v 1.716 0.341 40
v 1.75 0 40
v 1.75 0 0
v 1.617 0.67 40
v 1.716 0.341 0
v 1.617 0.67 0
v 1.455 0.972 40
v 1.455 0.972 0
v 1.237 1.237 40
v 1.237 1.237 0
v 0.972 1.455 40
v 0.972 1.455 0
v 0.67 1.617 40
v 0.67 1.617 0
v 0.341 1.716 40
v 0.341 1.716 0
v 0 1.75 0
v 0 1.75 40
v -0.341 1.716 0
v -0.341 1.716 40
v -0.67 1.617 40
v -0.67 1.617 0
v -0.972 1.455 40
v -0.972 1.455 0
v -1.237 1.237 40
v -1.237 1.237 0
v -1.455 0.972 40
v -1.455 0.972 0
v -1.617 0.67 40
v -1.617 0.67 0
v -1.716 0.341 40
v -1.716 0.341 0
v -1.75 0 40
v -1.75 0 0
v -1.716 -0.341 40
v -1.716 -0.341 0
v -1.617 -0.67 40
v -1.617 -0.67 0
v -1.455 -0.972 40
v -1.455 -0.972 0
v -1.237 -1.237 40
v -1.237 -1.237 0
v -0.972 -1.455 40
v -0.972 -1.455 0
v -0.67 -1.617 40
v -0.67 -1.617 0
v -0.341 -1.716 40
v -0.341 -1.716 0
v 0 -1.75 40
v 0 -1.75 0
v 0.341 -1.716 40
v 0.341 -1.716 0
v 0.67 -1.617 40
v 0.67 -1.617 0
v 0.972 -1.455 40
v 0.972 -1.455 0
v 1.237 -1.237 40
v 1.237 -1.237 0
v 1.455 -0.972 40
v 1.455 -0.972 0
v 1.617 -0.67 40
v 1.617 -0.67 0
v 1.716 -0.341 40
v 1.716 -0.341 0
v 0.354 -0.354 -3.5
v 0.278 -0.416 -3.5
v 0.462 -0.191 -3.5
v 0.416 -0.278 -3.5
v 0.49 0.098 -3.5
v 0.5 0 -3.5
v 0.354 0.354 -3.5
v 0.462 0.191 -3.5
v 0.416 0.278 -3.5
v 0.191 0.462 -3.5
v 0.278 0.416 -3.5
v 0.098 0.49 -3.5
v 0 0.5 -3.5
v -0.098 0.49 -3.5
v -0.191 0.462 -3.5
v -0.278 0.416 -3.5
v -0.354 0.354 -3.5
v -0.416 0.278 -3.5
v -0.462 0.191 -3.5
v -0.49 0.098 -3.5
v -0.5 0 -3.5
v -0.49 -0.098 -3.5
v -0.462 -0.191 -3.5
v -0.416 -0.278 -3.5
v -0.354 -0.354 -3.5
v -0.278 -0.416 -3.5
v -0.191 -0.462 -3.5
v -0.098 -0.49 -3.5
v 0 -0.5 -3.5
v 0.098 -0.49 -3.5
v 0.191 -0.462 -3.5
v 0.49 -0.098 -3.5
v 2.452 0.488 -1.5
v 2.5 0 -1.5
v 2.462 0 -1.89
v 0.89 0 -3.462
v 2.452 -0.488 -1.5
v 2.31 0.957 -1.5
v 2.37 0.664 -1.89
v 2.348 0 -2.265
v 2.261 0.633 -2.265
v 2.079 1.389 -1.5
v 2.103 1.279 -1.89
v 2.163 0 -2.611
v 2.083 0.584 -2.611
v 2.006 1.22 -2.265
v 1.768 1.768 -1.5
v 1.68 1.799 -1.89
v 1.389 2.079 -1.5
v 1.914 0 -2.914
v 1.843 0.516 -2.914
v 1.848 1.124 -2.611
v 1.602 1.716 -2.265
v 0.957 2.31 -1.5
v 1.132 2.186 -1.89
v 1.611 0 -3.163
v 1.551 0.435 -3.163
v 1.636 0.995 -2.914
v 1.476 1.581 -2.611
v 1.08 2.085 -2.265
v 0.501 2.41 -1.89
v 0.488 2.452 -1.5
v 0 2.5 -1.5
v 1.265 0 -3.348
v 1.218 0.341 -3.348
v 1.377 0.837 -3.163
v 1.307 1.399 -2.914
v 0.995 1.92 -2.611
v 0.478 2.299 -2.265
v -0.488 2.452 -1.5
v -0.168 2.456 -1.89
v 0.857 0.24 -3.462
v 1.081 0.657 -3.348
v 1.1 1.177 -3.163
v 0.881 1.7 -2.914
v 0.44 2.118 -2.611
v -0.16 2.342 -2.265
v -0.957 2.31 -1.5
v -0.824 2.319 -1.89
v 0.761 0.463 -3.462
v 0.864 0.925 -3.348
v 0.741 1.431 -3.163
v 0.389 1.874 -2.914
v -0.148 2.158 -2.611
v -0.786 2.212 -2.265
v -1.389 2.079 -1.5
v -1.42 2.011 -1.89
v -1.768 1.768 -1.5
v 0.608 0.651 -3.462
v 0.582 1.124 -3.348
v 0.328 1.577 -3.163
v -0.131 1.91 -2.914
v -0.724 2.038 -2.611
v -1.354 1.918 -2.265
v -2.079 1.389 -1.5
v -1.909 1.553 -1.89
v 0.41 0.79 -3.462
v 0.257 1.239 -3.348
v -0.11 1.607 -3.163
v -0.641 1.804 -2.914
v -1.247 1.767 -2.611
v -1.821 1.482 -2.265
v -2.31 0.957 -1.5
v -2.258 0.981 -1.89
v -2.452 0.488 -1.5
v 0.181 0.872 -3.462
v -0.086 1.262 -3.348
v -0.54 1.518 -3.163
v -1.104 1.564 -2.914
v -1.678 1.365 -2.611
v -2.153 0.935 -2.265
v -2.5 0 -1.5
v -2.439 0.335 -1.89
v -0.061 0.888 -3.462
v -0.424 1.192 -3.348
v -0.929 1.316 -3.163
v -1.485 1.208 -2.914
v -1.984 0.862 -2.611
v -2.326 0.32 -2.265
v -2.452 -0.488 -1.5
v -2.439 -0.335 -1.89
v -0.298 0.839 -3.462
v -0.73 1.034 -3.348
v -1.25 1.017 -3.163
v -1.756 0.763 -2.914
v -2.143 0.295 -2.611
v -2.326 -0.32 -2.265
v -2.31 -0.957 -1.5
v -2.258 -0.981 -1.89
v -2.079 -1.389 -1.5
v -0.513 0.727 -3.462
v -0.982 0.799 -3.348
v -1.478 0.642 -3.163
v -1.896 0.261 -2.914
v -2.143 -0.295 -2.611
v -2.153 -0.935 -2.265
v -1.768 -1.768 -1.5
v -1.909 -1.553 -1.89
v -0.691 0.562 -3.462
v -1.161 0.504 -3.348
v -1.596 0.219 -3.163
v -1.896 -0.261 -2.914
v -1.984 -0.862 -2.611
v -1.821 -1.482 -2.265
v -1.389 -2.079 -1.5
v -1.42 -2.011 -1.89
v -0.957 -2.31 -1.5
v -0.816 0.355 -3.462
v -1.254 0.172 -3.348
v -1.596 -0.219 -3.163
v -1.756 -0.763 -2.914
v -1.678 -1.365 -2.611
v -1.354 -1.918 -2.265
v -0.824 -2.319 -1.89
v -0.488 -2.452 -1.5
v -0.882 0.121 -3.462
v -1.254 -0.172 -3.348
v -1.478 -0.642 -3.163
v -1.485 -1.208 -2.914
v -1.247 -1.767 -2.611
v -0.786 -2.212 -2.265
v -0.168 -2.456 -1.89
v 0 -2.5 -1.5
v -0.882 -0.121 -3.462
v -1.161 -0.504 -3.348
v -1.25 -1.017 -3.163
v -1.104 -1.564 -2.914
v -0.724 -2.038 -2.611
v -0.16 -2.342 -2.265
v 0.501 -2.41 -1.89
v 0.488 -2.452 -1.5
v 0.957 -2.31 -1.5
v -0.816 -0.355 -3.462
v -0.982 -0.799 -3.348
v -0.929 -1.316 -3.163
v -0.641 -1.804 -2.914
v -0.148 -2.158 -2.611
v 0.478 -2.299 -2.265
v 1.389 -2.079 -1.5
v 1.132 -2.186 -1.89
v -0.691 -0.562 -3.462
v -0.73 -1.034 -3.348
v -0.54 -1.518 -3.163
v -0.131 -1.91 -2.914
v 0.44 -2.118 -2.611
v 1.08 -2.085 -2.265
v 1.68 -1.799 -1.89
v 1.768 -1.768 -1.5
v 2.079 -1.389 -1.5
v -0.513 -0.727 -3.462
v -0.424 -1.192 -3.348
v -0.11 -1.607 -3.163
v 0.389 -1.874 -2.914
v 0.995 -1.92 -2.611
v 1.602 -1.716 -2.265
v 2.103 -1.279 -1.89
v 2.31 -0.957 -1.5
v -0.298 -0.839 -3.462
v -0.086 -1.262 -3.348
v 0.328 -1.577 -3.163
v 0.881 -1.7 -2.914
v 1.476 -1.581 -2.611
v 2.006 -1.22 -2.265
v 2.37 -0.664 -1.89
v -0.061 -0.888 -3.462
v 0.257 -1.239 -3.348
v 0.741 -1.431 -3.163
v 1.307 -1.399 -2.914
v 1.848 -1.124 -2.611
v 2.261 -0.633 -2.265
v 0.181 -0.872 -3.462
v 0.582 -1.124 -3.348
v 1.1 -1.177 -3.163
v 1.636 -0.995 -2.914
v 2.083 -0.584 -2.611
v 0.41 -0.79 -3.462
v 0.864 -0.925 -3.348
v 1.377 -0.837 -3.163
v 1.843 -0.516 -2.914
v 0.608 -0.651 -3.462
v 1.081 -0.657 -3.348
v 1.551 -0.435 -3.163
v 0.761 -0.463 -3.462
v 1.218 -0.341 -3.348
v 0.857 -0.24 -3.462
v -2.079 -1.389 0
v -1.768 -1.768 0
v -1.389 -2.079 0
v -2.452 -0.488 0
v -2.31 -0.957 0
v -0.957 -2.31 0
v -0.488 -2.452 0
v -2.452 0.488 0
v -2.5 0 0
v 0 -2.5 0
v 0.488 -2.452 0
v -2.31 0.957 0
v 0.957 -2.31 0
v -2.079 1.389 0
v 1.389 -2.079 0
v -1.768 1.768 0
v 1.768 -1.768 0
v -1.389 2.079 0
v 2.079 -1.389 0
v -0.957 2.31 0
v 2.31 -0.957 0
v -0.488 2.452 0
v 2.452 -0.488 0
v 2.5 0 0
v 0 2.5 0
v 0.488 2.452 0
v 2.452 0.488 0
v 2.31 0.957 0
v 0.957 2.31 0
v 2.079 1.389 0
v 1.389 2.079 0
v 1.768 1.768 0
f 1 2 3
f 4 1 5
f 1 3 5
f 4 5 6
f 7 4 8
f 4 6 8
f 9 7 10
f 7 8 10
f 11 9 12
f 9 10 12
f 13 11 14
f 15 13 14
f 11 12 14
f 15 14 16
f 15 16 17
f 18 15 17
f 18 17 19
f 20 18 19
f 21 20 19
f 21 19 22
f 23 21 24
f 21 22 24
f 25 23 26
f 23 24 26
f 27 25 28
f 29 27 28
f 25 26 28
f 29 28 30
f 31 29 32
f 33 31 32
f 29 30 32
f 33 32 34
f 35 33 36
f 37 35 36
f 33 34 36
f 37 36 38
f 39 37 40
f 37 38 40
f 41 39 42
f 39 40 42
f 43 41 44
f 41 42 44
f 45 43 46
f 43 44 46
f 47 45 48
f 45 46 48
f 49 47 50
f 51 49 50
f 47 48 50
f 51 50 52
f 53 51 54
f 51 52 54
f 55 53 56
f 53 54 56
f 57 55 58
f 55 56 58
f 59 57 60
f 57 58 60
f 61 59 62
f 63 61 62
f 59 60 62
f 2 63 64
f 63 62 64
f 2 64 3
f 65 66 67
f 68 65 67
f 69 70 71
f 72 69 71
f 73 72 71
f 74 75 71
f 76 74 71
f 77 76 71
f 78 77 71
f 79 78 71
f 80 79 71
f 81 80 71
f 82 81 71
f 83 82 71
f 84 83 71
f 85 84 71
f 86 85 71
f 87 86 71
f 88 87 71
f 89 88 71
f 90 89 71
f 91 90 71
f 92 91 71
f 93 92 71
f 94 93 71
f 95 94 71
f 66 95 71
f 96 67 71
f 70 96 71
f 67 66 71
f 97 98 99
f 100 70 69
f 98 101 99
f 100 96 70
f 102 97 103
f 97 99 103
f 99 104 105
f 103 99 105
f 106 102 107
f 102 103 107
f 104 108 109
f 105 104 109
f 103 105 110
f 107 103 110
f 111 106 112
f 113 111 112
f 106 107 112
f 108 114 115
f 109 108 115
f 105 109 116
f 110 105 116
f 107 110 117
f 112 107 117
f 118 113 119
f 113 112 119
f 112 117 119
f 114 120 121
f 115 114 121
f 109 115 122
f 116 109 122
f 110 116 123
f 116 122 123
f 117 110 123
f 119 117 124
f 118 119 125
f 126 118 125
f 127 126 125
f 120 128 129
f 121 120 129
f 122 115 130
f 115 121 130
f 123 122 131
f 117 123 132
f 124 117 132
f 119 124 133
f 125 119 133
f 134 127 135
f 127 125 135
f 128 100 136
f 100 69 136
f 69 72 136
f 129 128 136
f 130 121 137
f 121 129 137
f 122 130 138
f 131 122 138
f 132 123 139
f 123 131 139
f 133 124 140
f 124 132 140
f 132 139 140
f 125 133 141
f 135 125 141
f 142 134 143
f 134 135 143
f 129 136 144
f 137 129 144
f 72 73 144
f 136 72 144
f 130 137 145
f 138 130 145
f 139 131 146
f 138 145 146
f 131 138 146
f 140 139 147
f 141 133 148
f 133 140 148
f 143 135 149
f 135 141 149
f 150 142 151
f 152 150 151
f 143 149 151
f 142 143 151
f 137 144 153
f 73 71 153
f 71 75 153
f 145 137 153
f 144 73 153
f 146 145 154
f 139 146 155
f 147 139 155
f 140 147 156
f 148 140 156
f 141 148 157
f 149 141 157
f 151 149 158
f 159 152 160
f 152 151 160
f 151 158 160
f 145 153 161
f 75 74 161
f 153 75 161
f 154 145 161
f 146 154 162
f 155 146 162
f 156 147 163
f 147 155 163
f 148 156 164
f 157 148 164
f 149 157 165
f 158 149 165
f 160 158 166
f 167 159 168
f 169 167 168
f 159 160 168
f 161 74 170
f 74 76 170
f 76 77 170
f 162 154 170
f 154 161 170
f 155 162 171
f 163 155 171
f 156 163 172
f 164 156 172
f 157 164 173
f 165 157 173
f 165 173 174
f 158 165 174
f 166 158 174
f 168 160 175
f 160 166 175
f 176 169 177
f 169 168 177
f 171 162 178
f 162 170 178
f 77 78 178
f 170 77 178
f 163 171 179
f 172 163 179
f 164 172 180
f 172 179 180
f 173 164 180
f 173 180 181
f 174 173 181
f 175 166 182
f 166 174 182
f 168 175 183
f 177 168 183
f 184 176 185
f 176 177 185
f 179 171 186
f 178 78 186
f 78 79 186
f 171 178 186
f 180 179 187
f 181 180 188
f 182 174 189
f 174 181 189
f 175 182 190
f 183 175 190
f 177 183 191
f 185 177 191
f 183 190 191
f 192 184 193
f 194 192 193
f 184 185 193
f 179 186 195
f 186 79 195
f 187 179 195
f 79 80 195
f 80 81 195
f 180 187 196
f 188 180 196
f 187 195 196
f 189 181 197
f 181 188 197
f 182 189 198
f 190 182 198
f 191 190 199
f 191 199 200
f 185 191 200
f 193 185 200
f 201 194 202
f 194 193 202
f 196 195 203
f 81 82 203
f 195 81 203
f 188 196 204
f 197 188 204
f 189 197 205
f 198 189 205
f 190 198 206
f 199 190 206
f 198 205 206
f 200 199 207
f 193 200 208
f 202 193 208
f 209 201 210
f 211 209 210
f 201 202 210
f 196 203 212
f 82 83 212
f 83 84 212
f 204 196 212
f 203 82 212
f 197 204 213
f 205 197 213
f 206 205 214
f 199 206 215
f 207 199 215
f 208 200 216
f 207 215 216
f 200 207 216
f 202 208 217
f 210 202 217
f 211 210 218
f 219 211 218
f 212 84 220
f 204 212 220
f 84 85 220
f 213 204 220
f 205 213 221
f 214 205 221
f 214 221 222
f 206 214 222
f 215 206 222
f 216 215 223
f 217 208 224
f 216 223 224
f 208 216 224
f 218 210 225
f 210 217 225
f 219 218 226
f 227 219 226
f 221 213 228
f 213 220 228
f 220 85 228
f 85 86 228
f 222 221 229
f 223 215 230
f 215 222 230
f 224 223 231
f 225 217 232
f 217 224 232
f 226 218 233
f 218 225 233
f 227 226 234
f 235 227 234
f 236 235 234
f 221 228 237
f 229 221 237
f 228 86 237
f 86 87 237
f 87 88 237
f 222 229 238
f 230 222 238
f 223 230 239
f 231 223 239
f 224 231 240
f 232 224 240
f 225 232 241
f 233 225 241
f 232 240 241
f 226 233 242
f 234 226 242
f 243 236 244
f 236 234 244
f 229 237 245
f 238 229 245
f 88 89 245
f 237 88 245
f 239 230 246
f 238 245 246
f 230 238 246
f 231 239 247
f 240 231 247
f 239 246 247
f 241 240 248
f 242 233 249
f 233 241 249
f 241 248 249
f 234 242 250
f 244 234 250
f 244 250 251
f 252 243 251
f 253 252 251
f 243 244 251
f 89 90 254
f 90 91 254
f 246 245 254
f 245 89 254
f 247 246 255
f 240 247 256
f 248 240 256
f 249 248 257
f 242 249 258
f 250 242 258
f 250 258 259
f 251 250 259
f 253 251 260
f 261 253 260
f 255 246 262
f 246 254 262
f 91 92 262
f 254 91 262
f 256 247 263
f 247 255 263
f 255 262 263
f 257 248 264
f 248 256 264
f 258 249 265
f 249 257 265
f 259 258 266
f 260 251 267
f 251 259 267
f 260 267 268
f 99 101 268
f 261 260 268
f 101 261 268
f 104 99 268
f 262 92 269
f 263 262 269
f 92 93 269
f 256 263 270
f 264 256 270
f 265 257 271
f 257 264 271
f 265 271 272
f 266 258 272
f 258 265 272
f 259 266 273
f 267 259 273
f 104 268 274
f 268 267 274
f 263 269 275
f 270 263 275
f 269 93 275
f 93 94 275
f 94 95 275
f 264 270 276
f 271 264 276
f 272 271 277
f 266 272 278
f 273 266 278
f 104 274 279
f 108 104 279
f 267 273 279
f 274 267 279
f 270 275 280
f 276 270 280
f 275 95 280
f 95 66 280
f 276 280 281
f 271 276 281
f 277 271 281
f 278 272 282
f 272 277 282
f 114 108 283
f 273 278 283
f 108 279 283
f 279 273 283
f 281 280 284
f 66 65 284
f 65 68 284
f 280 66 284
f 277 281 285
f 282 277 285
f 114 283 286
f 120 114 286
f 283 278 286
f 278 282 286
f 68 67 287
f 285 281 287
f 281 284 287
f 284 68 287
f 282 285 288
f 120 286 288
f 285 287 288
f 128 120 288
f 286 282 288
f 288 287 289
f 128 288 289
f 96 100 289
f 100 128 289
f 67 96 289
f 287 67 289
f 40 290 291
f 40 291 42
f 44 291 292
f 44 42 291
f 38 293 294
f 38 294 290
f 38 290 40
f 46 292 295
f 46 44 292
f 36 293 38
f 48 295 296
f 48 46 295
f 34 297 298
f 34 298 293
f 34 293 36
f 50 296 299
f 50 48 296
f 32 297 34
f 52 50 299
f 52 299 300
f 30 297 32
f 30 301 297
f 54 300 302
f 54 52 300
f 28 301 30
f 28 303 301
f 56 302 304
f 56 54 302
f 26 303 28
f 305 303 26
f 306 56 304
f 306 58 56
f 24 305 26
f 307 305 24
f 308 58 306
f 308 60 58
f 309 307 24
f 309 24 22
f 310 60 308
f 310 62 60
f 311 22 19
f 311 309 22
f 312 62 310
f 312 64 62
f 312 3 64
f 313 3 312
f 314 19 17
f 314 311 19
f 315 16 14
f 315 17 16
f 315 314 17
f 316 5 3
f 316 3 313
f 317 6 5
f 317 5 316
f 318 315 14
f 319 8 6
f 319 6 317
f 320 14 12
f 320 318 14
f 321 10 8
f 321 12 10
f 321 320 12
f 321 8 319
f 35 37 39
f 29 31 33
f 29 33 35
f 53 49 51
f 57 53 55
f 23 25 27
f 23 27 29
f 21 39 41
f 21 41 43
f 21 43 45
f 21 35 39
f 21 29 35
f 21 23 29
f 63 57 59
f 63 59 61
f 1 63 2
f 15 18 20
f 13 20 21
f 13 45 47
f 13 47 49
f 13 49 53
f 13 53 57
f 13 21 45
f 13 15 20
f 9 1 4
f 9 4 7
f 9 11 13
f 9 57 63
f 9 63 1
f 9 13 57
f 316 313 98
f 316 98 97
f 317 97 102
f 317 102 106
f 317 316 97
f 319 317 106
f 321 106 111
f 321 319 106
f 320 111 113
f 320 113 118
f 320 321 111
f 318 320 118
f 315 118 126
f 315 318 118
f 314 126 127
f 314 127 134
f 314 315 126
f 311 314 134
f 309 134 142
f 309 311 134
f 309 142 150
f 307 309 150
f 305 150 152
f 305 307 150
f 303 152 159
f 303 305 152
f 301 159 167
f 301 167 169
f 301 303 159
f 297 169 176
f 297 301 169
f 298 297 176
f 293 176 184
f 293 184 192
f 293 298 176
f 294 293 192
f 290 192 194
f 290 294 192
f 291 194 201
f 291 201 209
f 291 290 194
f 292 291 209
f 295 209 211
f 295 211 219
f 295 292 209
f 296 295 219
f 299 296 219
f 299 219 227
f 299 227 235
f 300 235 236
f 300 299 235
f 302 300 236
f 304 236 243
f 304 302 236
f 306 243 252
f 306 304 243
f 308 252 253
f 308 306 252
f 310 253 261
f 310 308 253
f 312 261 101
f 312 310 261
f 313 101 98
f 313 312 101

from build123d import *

# Parameters (mm, degrees)
F0_R     = 1.75
F1_DEPTH = 40
F0_R_2   = 2.5
F2_DEPTH = 3.5
F3_R     = 2


with BuildPart() as f1:
    # F0 (on Top) → F1 (new body)
    with BuildSketch(Plane.XY):
        Circle(F0_R)
    extrude(amount=F1_DEPTH)

    # F0 (on Top) → F2 (join)
    with BuildSketch(Plane.XY):
        Circle(F0_R_2)
        Circle(F0_R, mode=Mode.SUBTRACT)
        Circle(F0_R)
    extrude(amount=-F2_DEPTH)

    # F3
    f3_edges = [f1.edges().sort_by_distance(p)[0] for p in [
        (-2.5, 0, -3.5),
    ]]
    fillet(f3_edges, radius=F3_R)


solid = f1.part
